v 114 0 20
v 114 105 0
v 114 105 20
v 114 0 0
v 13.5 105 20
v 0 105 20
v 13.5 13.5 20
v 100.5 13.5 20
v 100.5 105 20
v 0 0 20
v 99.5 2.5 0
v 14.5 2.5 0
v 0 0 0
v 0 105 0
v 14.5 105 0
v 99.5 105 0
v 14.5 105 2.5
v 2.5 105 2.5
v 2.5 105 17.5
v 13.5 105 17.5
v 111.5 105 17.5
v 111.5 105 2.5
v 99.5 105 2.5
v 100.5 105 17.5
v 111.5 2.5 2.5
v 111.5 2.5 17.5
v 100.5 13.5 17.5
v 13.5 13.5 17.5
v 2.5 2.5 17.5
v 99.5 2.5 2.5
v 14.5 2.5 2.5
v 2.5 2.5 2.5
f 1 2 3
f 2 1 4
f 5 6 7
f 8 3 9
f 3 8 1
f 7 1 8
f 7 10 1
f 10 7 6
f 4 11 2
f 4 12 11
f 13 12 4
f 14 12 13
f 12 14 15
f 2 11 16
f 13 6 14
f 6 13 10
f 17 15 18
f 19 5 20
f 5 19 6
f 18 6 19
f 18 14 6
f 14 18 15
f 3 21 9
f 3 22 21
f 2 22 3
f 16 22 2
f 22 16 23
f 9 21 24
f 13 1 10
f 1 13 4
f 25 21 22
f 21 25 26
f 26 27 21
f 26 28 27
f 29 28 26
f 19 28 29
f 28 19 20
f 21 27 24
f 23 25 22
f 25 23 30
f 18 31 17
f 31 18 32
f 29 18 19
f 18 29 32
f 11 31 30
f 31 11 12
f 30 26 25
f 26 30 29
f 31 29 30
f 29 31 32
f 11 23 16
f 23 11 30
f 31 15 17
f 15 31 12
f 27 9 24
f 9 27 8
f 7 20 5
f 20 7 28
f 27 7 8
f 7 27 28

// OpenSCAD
breite=109;
hoehe=100;
tiefe=15;
dicke=5;

difference()
{
    cube([breite+dicke, hoehe+dicke, tiefe+dicke]);
    translate([dicke/2,dicke/2,dicke/2])
    cube([breite, hoehe+10, tiefe]);
    translate([dicke/2+12,dicke/2,dicke/2-10])
    cube([breite-24, hoehe+10, tiefe+10]);
    translate([dicke/2+11,dicke/2+11,dicke/2])
    cube([breite-22, hoehe+10, tiefe+10]);
}
